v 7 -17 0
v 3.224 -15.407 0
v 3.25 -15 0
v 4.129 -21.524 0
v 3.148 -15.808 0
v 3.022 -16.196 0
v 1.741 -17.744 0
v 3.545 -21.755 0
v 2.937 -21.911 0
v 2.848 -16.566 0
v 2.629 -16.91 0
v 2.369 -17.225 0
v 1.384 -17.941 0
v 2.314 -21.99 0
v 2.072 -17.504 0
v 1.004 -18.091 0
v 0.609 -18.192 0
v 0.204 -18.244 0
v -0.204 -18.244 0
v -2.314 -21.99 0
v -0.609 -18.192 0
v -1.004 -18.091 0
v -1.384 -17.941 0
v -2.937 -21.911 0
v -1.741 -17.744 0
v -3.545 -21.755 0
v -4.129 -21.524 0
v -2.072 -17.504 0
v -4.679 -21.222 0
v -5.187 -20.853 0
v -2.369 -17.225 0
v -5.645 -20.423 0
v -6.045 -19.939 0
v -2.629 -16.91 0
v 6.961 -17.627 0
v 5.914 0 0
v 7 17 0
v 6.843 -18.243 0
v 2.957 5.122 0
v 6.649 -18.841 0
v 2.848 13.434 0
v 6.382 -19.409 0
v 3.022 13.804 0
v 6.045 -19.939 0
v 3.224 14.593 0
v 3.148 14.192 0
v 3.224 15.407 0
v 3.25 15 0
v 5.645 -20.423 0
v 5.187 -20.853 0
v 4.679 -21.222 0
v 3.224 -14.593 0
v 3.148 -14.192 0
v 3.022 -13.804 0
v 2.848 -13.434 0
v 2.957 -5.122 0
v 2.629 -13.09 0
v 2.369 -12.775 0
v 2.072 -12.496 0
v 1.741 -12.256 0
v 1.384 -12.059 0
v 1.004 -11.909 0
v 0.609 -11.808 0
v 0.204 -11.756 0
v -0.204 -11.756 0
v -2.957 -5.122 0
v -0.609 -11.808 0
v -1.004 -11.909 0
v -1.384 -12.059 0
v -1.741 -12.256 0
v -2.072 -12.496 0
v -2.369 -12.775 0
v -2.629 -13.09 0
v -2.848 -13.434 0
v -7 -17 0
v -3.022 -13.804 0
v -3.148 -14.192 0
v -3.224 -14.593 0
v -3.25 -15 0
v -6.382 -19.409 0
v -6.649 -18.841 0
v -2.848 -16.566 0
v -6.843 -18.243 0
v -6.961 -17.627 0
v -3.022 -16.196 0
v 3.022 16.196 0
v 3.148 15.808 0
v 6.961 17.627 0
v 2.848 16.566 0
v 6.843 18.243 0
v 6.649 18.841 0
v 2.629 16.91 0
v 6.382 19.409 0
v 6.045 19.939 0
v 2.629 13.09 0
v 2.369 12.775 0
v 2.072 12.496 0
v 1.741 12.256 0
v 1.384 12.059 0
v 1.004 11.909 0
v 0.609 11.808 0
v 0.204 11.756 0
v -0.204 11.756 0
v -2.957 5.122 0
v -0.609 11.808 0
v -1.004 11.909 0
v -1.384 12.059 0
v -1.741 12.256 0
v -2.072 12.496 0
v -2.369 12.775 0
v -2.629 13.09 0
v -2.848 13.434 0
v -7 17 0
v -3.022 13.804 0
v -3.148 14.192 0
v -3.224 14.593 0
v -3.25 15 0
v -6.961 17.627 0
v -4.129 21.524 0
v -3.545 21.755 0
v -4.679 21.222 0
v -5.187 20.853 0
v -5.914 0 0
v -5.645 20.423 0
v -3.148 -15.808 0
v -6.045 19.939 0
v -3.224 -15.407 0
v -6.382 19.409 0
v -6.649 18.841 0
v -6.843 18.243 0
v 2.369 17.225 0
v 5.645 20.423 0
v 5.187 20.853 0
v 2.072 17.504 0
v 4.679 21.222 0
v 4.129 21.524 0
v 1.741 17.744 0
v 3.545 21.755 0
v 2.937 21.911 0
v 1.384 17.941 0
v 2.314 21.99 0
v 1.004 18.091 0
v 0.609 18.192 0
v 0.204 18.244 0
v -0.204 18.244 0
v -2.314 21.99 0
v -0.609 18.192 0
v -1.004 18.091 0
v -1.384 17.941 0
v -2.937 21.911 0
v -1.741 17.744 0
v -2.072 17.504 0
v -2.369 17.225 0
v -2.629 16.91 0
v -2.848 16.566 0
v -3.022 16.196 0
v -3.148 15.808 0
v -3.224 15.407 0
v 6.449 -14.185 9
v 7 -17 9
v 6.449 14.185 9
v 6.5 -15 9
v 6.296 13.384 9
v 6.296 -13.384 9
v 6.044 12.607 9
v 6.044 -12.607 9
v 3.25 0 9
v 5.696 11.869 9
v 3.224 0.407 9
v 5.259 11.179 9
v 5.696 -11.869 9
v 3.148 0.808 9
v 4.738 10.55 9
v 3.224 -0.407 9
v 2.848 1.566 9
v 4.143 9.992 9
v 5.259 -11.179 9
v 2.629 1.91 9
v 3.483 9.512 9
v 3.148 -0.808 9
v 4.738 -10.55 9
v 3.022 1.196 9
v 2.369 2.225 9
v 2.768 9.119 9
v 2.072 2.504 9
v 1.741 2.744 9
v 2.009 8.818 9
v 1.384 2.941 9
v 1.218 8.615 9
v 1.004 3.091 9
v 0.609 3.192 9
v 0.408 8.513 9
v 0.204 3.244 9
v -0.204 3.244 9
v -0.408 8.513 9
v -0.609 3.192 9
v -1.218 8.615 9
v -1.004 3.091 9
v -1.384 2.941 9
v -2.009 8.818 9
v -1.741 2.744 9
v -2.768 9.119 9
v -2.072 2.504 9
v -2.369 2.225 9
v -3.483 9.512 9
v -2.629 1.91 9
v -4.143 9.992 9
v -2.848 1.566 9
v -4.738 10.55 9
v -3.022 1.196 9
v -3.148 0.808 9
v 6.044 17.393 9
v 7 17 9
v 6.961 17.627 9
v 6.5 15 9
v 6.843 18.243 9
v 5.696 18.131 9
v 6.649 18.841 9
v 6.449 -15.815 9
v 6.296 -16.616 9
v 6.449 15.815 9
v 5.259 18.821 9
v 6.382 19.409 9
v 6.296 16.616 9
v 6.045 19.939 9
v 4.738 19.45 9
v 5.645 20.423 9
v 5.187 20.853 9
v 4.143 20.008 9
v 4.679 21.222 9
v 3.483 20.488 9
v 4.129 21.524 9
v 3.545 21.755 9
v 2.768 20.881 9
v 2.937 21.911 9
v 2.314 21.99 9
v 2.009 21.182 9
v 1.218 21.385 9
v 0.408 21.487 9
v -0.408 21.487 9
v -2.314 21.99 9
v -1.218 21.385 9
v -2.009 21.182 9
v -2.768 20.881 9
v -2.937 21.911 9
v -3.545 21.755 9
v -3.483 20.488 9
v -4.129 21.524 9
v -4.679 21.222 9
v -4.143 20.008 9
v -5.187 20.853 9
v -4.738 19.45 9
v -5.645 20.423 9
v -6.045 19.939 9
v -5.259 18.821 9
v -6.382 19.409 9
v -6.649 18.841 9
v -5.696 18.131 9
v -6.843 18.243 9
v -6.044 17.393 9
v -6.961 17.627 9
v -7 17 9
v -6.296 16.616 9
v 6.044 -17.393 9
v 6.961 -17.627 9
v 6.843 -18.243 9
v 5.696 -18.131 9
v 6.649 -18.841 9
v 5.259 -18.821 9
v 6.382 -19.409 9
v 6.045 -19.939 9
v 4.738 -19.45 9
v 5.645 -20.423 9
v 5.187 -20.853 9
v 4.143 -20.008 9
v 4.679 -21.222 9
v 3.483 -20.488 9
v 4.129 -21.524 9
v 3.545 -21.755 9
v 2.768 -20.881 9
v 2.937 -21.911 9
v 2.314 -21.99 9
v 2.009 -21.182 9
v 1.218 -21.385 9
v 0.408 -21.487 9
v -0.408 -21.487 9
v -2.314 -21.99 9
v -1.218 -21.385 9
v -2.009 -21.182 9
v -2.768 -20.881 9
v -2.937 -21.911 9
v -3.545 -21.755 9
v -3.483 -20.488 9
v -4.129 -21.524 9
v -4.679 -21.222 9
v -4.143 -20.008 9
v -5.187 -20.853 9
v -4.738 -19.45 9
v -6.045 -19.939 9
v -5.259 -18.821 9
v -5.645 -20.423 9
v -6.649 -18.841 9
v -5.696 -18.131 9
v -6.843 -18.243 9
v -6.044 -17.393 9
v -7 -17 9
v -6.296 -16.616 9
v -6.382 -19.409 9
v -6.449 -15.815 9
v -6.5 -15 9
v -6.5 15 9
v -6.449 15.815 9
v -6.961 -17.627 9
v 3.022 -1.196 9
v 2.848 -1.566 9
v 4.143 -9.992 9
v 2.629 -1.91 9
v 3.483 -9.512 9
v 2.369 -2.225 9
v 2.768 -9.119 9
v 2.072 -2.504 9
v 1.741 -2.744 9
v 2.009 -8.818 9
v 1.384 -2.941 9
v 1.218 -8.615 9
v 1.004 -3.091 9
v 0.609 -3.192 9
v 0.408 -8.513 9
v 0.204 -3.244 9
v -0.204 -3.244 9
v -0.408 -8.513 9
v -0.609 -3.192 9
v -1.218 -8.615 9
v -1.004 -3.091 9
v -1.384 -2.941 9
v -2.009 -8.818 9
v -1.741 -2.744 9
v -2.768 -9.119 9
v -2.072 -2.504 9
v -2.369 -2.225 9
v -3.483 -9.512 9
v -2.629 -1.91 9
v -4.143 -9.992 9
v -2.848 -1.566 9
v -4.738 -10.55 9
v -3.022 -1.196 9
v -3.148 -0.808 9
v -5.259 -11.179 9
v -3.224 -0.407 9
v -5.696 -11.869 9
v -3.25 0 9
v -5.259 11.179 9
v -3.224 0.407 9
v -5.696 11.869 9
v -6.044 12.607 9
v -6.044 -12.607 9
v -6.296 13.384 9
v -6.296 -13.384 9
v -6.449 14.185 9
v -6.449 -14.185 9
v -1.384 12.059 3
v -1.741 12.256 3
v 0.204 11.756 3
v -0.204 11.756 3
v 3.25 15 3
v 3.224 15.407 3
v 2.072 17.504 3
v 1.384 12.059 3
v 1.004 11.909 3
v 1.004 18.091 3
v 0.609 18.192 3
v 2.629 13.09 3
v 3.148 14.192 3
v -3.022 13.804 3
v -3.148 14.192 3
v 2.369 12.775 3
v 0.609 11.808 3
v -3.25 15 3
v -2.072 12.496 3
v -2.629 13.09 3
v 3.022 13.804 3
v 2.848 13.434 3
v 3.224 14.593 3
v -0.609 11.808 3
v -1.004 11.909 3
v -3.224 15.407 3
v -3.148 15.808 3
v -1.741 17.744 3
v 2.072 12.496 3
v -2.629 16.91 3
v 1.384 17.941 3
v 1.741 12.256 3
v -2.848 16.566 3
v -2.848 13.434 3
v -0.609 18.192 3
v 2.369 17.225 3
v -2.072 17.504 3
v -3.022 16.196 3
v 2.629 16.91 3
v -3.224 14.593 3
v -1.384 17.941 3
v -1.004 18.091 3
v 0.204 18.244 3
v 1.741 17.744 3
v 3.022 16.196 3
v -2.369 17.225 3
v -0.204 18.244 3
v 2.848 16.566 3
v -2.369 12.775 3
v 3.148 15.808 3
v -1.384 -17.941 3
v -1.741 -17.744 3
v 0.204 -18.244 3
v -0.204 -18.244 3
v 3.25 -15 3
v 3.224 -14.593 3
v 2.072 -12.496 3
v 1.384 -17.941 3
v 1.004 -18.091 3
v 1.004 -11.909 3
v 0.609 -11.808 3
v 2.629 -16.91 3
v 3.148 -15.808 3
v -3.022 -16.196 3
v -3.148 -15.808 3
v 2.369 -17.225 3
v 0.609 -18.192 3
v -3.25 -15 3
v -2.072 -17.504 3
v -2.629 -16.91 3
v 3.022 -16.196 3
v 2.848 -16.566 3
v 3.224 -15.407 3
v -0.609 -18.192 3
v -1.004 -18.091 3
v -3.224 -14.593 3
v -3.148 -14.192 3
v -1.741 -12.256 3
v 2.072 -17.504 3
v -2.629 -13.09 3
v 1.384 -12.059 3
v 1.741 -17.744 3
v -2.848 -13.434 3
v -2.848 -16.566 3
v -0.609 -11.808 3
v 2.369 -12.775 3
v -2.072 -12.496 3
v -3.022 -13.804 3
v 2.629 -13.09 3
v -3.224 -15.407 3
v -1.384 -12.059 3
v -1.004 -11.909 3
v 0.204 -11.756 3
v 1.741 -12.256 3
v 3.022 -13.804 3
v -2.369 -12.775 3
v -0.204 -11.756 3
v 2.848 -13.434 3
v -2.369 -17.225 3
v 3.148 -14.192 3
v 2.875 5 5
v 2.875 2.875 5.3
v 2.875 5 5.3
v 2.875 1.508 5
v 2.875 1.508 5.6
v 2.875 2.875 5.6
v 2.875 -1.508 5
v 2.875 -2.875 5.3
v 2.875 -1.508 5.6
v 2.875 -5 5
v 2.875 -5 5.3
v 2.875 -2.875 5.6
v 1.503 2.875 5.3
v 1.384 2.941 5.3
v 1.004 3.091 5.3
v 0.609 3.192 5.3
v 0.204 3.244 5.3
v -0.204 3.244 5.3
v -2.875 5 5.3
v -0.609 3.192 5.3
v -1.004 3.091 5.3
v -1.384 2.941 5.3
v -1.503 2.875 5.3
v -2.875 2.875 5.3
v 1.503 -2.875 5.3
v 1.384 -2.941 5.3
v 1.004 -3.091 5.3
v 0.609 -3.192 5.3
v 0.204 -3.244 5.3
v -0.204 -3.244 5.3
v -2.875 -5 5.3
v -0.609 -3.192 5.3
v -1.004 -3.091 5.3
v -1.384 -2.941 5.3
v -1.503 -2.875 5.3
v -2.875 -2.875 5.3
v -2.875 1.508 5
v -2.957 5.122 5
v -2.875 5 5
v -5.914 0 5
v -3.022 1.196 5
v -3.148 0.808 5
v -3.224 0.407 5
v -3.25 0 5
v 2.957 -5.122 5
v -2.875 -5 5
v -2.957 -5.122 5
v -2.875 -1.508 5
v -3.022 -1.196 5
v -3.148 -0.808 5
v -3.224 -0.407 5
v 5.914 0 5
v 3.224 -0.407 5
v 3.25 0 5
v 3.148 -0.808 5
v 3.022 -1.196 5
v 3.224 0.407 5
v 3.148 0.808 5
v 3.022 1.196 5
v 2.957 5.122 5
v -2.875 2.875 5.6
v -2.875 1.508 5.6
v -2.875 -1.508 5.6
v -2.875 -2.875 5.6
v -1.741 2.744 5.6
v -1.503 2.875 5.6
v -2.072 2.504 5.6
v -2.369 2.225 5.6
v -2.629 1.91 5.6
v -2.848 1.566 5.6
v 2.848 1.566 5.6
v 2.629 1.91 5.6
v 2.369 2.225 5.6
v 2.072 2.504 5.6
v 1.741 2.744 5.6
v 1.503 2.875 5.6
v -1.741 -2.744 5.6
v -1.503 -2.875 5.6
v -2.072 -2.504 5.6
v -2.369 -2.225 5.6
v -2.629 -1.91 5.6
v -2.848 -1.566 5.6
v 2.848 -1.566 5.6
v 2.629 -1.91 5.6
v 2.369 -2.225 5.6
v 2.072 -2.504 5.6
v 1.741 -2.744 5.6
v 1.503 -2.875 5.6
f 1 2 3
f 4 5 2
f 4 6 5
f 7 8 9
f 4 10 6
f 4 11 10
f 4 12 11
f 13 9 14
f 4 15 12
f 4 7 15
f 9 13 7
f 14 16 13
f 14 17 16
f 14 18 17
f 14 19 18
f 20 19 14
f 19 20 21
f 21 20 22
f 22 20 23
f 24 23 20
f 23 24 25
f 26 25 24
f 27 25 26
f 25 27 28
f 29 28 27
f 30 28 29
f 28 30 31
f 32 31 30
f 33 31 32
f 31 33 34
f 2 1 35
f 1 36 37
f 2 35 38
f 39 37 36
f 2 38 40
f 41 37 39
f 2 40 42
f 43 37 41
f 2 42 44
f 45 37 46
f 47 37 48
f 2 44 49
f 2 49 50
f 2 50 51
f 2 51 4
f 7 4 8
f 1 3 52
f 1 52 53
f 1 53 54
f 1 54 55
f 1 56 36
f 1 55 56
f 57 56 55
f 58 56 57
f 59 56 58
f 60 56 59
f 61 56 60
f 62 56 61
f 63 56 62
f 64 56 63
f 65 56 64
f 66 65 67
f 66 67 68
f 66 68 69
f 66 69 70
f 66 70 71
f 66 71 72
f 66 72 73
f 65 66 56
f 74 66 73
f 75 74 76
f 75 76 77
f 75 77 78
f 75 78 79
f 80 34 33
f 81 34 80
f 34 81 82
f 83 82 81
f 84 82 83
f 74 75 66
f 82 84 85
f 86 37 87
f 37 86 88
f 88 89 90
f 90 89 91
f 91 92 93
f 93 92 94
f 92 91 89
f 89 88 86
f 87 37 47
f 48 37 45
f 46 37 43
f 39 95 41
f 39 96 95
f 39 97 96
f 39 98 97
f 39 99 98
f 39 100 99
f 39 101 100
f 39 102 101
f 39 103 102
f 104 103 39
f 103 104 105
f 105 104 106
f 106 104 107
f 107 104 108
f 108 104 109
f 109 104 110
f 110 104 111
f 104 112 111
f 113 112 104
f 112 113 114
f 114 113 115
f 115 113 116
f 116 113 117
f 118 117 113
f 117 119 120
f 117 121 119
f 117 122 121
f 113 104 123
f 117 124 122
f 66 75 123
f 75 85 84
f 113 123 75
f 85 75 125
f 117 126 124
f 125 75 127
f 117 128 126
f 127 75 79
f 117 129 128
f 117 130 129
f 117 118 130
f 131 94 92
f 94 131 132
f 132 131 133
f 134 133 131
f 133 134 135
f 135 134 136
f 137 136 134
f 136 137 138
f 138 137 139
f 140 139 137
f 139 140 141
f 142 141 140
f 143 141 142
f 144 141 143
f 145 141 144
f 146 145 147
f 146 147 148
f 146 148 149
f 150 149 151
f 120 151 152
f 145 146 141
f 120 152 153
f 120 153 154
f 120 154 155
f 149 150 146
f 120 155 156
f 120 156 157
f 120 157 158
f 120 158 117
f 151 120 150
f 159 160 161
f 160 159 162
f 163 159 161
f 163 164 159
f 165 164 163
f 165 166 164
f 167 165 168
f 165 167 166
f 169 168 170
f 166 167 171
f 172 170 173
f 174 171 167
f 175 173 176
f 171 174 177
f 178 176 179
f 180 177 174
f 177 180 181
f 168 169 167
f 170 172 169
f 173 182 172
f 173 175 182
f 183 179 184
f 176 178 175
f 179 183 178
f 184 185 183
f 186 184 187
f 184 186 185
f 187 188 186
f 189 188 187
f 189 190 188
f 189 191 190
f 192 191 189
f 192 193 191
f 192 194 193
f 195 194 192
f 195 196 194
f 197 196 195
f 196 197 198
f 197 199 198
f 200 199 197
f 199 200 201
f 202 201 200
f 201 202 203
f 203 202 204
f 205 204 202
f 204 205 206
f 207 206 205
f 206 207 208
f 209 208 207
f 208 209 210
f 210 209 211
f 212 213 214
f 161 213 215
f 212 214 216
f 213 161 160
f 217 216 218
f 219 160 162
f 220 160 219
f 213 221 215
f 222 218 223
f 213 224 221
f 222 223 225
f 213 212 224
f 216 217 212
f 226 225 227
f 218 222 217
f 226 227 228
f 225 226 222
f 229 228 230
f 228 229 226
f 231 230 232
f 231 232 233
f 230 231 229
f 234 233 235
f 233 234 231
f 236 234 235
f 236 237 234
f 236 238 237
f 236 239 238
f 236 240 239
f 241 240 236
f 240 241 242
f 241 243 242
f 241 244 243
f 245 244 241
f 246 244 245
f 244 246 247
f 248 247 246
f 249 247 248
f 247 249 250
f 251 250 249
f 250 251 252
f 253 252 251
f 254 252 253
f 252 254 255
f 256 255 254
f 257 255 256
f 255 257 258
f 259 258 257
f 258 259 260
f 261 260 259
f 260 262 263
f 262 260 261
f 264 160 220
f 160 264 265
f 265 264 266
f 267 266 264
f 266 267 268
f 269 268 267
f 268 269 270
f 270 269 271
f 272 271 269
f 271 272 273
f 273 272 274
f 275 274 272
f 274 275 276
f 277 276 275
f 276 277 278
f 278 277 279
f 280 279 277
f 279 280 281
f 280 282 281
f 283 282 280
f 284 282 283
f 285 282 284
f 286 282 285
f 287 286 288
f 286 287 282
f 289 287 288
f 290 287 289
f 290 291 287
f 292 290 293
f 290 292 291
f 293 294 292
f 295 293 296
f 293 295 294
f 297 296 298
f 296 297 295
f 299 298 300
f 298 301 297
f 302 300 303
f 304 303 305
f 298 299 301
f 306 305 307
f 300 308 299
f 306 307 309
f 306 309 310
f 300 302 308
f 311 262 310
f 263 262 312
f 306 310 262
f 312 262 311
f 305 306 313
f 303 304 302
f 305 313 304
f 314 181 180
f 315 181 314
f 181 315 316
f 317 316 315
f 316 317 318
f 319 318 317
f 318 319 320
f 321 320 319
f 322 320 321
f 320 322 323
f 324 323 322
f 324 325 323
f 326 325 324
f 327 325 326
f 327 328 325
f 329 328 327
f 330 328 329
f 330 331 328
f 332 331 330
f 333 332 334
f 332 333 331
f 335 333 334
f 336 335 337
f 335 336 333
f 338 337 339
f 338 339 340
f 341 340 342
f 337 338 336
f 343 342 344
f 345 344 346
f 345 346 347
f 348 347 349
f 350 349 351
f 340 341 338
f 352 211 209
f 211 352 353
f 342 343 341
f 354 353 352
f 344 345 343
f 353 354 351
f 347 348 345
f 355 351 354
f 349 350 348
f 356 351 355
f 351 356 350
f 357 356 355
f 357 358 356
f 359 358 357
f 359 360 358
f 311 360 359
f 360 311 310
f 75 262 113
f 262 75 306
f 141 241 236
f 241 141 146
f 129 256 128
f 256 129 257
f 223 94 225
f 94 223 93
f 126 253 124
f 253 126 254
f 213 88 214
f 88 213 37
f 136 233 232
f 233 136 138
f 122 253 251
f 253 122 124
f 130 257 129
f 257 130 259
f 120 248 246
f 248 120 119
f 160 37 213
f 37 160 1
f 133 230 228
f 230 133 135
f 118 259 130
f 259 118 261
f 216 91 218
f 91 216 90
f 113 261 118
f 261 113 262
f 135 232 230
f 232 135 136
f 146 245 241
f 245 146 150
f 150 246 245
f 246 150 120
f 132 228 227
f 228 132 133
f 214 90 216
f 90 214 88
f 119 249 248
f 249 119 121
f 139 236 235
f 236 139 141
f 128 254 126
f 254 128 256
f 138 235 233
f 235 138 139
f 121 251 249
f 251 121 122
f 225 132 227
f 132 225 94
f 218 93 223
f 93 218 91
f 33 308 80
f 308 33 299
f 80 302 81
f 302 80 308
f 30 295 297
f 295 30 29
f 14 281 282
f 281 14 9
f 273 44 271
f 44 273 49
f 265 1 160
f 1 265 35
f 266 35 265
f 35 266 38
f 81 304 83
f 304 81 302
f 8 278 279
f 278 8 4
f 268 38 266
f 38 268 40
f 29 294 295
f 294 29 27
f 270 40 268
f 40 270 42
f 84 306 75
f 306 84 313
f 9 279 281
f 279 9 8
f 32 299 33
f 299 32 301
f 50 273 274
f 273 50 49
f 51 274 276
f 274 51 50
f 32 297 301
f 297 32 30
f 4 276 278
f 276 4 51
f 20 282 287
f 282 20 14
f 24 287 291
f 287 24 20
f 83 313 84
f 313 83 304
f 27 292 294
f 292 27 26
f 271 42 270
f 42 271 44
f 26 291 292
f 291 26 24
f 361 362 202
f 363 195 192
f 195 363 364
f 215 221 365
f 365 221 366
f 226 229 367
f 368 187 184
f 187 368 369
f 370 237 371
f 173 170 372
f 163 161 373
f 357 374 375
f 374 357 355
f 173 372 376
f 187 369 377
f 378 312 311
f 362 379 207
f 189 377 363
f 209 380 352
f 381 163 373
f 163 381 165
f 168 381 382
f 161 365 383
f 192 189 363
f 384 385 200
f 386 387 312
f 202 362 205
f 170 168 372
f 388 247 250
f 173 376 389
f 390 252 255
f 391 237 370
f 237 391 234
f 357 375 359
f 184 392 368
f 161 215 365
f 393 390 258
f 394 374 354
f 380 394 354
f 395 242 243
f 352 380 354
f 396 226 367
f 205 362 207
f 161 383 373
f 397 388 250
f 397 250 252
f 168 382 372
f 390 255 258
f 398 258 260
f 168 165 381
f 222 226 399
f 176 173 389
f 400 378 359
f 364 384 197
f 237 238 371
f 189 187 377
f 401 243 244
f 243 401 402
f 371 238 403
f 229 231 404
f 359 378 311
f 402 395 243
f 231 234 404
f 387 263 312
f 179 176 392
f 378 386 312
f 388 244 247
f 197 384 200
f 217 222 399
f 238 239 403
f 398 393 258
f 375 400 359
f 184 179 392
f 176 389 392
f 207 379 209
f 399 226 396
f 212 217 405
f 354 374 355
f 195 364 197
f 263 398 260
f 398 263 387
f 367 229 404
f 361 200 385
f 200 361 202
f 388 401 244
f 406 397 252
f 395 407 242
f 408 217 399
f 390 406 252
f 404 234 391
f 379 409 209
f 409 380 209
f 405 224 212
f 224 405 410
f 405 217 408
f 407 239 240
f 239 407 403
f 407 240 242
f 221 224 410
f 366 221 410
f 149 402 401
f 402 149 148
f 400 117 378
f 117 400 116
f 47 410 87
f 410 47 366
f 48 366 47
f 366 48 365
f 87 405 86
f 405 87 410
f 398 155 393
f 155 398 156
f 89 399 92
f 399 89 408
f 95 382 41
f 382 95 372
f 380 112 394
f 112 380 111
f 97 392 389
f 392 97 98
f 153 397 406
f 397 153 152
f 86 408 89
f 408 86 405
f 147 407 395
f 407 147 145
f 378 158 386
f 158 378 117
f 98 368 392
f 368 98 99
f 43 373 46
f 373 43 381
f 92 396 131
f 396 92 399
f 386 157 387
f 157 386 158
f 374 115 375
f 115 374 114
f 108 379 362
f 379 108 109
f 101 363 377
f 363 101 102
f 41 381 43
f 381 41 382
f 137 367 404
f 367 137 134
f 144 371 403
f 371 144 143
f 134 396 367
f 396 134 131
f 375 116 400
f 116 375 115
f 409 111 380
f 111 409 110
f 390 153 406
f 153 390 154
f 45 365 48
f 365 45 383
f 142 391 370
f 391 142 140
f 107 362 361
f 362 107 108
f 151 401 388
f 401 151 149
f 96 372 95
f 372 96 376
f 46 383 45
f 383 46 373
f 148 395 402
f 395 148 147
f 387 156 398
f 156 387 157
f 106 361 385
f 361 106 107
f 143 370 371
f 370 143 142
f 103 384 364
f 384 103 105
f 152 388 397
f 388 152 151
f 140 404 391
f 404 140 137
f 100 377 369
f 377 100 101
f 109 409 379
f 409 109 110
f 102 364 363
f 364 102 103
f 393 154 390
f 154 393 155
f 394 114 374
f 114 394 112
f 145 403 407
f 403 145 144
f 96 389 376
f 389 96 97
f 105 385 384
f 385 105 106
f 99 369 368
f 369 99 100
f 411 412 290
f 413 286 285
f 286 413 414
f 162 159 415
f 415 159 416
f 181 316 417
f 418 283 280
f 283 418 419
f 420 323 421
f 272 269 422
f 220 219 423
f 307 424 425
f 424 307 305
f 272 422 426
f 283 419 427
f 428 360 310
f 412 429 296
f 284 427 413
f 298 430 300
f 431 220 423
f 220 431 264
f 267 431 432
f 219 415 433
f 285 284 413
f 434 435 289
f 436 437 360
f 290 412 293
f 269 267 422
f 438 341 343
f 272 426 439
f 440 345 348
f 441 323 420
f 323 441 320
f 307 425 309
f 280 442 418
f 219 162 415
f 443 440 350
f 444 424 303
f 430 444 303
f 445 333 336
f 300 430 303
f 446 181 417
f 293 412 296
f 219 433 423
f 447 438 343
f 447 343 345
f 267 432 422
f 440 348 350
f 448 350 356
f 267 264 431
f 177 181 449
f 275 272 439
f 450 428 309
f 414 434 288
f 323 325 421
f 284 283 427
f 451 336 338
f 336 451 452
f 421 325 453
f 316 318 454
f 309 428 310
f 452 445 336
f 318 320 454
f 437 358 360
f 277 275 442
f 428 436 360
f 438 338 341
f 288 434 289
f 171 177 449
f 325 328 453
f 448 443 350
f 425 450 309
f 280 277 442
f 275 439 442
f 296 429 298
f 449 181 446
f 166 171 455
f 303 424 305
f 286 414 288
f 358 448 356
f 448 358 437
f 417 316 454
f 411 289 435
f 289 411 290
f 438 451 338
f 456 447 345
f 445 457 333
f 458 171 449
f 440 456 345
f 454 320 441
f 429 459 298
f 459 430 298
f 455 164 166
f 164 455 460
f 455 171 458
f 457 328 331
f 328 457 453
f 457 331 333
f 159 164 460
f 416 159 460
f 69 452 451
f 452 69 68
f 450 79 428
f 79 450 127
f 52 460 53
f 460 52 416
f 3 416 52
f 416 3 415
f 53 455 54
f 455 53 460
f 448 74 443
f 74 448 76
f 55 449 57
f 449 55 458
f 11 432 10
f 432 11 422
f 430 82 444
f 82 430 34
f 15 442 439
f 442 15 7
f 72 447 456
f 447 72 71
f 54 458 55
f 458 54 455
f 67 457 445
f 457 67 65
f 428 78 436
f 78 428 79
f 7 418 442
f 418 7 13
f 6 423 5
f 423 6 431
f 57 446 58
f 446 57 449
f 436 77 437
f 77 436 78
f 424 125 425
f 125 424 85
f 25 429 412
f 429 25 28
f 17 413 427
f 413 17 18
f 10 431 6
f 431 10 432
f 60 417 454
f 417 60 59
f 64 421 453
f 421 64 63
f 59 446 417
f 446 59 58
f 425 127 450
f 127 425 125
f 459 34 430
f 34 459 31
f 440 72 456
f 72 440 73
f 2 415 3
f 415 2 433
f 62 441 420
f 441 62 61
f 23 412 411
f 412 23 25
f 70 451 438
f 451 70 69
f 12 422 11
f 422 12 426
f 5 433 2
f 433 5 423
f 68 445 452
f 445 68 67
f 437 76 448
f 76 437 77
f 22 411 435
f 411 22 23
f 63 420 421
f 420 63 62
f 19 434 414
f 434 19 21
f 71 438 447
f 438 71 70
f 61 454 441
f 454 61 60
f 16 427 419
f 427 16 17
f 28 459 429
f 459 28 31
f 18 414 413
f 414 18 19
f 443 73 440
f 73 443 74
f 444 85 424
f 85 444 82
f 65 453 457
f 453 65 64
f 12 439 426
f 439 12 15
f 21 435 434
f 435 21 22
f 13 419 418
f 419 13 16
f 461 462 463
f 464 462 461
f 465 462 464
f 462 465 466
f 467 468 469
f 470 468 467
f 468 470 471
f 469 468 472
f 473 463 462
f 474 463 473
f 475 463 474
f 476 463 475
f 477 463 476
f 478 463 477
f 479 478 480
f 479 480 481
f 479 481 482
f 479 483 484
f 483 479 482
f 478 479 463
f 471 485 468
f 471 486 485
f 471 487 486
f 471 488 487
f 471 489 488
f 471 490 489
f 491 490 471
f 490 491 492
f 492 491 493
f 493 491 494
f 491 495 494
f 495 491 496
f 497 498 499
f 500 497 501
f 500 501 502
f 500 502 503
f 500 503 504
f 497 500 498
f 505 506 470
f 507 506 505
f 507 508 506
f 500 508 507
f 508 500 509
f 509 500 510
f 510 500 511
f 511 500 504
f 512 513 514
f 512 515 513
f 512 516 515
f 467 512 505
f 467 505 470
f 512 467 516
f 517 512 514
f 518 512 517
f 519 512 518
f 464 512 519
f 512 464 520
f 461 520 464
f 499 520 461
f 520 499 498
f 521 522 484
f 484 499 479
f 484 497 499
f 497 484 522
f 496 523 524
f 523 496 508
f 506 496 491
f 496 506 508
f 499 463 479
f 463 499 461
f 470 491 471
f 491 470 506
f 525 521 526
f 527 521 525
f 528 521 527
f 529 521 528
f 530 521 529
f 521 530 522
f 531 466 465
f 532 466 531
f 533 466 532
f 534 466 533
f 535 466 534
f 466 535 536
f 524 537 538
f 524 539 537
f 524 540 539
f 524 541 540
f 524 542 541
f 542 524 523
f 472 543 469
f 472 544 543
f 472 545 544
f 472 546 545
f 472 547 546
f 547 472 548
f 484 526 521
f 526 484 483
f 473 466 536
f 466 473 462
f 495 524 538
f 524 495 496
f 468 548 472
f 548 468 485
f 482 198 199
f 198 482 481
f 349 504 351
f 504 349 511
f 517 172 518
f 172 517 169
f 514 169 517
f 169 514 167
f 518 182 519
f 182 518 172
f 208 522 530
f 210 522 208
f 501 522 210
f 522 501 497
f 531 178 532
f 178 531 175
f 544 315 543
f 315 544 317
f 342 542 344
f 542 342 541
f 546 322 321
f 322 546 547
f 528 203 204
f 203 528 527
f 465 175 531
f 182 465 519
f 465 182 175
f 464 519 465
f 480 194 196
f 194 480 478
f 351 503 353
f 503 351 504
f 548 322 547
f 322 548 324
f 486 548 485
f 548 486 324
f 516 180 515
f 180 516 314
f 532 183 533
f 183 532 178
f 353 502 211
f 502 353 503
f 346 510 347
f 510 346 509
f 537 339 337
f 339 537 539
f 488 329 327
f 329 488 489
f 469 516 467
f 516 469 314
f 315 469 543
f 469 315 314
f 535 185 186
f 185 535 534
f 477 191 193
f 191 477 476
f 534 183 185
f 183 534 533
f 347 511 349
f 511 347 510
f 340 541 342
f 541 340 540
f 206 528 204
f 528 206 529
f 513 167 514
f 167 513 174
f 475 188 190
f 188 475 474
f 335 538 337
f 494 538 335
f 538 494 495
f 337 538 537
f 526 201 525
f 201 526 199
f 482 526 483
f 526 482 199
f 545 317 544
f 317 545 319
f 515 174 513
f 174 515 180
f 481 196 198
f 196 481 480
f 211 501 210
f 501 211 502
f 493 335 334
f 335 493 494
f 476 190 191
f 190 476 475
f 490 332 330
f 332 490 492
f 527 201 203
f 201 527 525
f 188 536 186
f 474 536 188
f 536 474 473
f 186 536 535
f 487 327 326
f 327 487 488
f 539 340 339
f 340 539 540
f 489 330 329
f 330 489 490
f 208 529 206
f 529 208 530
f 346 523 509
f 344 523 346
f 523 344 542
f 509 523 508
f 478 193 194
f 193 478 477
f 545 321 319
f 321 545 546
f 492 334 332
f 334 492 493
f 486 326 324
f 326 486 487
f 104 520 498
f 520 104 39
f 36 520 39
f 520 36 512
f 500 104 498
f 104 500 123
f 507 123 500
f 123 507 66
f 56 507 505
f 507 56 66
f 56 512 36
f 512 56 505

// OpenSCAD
$fn = 50;


difference() {
	union() {
		cylinder(h = 9, r = 7.0000000000);
		translate(v = [0.0000000000, 7.5000000000, 0]) {
			hull() {
				translate(v = [-2.0000000000, 9.5000000000, 0]) {
					cylinder(h = 9, r = 5);
				}
				translate(v = [2.0000000000, 9.5000000000, 0]) {
					cylinder(h = 9, r = 5);
				}
				translate(v = [-2.0000000000, -9.5000000000, 0]) {
					cylinder(h = 9, r = 5);
				}
				translate(v = [2.0000000000, -9.5000000000, 0]) {
					cylinder(h = 9, r = 5);
				}
			}
		}
		translate(v = [0.0000000000, 7.5000000000, 0]) {
			hull() {
				translate(v = [-2.0000000000, 9.5000000000, 0]) {
					cylinder(h = 9, r = 5);
				}
				translate(v = [2.0000000000, 9.5000000000, 0]) {
					cylinder(h = 9, r = 5);
				}
				translate(v = [-2.0000000000, -9.5000000000, 0]) {
					cylinder(h = 9, r = 5);
				}
				translate(v = [2.0000000000, -9.5000000000, 0]) {
					cylinder(h = 9, r = 5);
				}
			}
		}
		translate(v = [0.0000000000, -7.5000000000, 0]) {
			hull() {
				translate(v = [-2.0000000000, 9.5000000000, 0]) {
					cylinder(h = 9, r = 5);
				}
				translate(v = [2.0000000000, 9.5000000000, 0]) {
					cylinder(h = 9, r = 5);
				}
				translate(v = [-2.0000000000, -9.5000000000, 0]) {
					cylinder(h = 9, r = 5);
				}
				translate(v = [2.0000000000, -9.5000000000, 0]) {
					cylinder(h = 9, r = 5);
				}
			}
		}
		translate(v = [0.0000000000, -7.5000000000, 0]) {
			hull() {
				translate(v = [-2.0000000000, 9.5000000000, 0]) {
					cylinder(h = 9, r = 5);
				}
				translate(v = [2.0000000000, 9.5000000000, 0]) {
					cylinder(h = 9, r = 5);
				}
				translate(v = [-2.0000000000, -9.5000000000, 0]) {
					cylinder(h = 9, r = 5);
				}
				translate(v = [2.0000000000, -9.5000000000, 0]) {
					cylinder(h = 9, r = 5);
				}
			}
		}
	}
	union() {
		translate(v = [0.0000000000, 15.0000000000, 9]) {
			rotate(a = [0, 0, 0]) {
				difference() {
					union() {
						#translate(v = [0, 0, -9.0000000000]) {
							cylinder(h = 9, r = 2.2500000000);
						}
						#translate(v = [0, 0, -6]) {
							cylinder(h = 6, r1 = 3.2500000000, r2 = 6.5000000000);
						}
						#translate(v = [0, 0, -9.0000000000]) {
							cylinder(h = 9, r = 3.2500000000);
						}
						#translate(v = [0, 0, -9.0000000000]) {
							cylinder(h = 9, r = 2.2500000000);
						}
					}
					union();
				}
			}
		}
		translate(v = [0.0000000000, 15.0000000000, 9]) {
			rotate(a = [0, 0, 0]) {
				difference() {
					union() {
						#translate(v = [0, 0, -9.0000000000]) {
							cylinder(h = 9, r = 2.2500000000);
						}
						#translate(v = [0, 0, -6]) {
							cylinder(h = 6, r1 = 3.2500000000, r2 = 6.5000000000);
						}
						#translate(v = [0, 0, -9.0000000000]) {
							cylinder(h = 9, r = 3.2500000000);
						}
						#translate(v = [0, 0, -9.0000000000]) {
							cylinder(h = 9, r = 2.2500000000);
						}
					}
					union();
				}
			}
		}
		translate(v = [0.0000000000, -15.0000000000, 9]) {
			rotate(a = [0, 0, 0]) {
				difference() {
					union() {
						#translate(v = [0, 0, -9.0000000000]) {
							cylinder(h = 9, r = 2.2500000000);
						}
						#translate(v = [0, 0, -6]) {
							cylinder(h = 6, r1 = 3.2500000000, r2 = 6.5000000000);
						}
						#translate(v = [0, 0, -9.0000000000]) {
							cylinder(h = 9, r = 3.2500000000);
						}
						#translate(v = [0, 0, -9.0000000000]) {
							cylinder(h = 9, r = 2.2500000000);
						}
					}
					union();
				}
			}
		}
		translate(v = [0.0000000000, -15.0000000000, 9]) {
			rotate(a = [0, 0, 0]) {
				difference() {
					union() {
						#translate(v = [0, 0, -9.0000000000]) {
							cylinder(h = 9, r = 2.2500000000);
						}
						#translate(v = [0, 0, -6]) {
							cylinder(h = 6, r1 = 3.2500000000, r2 = 6.5000000000);
						}
						#translate(v = [0, 0, -9.0000000000]) {
							cylinder(h = 9, r = 3.2500000000);
						}
						#translate(v = [0, 0, -9.0000000000]) {
							cylinder(h = 9, r = 2.2500000000);
						}
					}
					union();
				}
			}
		}
		translate(v = [0.0000000000, 0.0000000000, 0]) {
			rotate(a = [0, 0, 0]) {
				difference() {
					union() {
						#translate(v = [-2.8750000000, -5.0000000000, -0.3000000000]) {
							cube(size = [5.7500000000, 10, 0.3000000000]);
						}
						#translate(v = [-2.8750000000, -2.8750000000, -0.6000000000]) {
							cube(size = [5.7500000000, 5.7500000000, 0.3000000000]);
						}
						#translate(v = [-2.8750000000, -5.0000000000, 5]) {
							cube(size = [5.7500000000, 10, 0.3000000000]);
						}
						#translate(v = [-2.8750000000, -2.8750000000, 5.3000000000]) {
							cube(size = [5.7500000000, 5.7500000000, 0.3000000000]);
						}
						#translate(v = [0, 0, -100.0000000000]) {
							cylinder(h = 200, r = 3.2500000000);
						}
						#linear_extrude(height = 5) {
							polygon(points = [[5.9142500000, 0.0000000000], [2.9571250000, 5.1218907443], [-2.9571250000, 5.1218907443], [-5.9142500000, 0.0000000000], [-2.9571250000, -5.1218907443], [2.9571250000, -5.1218907443]]);
						}
						#translate(v = [-2.8750000000, -5.0000000000, -0.3000000000]) {
							cube(size = [5.7500000000, 10, 0.3000000000]);
						}
						#translate(v = [-2.8750000000, -2.8750000000, -0.6000000000]) {
							cube(size = [5.7500000000, 5.7500000000, 0.3000000000]);
						}
						#translate(v = [-2.8750000000, -5.0000000000, 5]) {
							cube(size = [5.7500000000, 10, 0.3000000000]);
						}
						#translate(v = [-2.8750000000, -2.8750000000, 5.3000000000]) {
							cube(size = [5.7500000000, 5.7500000000, 0.3000000000]);
						}
						#translate(v = [0, 0, -100.0000000000]) {
							cylinder(h = 200, r = 3.2500000000);
						}
						#translate(v = [-2.8750000000, -5.0000000000, -0.3000000000]) {
							cube(size = [5.7500000000, 10, 0.3000000000]);
						}
						#translate(v = [-2.8750000000, -2.8750000000, -0.6000000000]) {
							cube(size = [5.7500000000, 5.7500000000, 0.3000000000]);
						}
						#translate(v = [-2.8750000000, -5.0000000000, 5]) {
							cube(size = [5.7500000000, 10, 0.3000000000]);
						}
						#translate(v = [-2.8750000000, -2.8750000000, 5.3000000000]) {
							cube(size = [5.7500000000, 5.7500000000, 0.3000000000]);
						}
						#translate(v = [0, 0, -100.0000000000]) {
							cylinder(h = 200, r = 3.2500000000);
						}
					}
					union();
				}
			}
		}
		translate(v = [0, 0, -100]) {
			cylinder(h = 200, r = 3.2500000000);
		}
		translate(v = [0, 0, -100]) {
			cylinder(h = 200, r = 1.8000000000);
		}
	}
}
